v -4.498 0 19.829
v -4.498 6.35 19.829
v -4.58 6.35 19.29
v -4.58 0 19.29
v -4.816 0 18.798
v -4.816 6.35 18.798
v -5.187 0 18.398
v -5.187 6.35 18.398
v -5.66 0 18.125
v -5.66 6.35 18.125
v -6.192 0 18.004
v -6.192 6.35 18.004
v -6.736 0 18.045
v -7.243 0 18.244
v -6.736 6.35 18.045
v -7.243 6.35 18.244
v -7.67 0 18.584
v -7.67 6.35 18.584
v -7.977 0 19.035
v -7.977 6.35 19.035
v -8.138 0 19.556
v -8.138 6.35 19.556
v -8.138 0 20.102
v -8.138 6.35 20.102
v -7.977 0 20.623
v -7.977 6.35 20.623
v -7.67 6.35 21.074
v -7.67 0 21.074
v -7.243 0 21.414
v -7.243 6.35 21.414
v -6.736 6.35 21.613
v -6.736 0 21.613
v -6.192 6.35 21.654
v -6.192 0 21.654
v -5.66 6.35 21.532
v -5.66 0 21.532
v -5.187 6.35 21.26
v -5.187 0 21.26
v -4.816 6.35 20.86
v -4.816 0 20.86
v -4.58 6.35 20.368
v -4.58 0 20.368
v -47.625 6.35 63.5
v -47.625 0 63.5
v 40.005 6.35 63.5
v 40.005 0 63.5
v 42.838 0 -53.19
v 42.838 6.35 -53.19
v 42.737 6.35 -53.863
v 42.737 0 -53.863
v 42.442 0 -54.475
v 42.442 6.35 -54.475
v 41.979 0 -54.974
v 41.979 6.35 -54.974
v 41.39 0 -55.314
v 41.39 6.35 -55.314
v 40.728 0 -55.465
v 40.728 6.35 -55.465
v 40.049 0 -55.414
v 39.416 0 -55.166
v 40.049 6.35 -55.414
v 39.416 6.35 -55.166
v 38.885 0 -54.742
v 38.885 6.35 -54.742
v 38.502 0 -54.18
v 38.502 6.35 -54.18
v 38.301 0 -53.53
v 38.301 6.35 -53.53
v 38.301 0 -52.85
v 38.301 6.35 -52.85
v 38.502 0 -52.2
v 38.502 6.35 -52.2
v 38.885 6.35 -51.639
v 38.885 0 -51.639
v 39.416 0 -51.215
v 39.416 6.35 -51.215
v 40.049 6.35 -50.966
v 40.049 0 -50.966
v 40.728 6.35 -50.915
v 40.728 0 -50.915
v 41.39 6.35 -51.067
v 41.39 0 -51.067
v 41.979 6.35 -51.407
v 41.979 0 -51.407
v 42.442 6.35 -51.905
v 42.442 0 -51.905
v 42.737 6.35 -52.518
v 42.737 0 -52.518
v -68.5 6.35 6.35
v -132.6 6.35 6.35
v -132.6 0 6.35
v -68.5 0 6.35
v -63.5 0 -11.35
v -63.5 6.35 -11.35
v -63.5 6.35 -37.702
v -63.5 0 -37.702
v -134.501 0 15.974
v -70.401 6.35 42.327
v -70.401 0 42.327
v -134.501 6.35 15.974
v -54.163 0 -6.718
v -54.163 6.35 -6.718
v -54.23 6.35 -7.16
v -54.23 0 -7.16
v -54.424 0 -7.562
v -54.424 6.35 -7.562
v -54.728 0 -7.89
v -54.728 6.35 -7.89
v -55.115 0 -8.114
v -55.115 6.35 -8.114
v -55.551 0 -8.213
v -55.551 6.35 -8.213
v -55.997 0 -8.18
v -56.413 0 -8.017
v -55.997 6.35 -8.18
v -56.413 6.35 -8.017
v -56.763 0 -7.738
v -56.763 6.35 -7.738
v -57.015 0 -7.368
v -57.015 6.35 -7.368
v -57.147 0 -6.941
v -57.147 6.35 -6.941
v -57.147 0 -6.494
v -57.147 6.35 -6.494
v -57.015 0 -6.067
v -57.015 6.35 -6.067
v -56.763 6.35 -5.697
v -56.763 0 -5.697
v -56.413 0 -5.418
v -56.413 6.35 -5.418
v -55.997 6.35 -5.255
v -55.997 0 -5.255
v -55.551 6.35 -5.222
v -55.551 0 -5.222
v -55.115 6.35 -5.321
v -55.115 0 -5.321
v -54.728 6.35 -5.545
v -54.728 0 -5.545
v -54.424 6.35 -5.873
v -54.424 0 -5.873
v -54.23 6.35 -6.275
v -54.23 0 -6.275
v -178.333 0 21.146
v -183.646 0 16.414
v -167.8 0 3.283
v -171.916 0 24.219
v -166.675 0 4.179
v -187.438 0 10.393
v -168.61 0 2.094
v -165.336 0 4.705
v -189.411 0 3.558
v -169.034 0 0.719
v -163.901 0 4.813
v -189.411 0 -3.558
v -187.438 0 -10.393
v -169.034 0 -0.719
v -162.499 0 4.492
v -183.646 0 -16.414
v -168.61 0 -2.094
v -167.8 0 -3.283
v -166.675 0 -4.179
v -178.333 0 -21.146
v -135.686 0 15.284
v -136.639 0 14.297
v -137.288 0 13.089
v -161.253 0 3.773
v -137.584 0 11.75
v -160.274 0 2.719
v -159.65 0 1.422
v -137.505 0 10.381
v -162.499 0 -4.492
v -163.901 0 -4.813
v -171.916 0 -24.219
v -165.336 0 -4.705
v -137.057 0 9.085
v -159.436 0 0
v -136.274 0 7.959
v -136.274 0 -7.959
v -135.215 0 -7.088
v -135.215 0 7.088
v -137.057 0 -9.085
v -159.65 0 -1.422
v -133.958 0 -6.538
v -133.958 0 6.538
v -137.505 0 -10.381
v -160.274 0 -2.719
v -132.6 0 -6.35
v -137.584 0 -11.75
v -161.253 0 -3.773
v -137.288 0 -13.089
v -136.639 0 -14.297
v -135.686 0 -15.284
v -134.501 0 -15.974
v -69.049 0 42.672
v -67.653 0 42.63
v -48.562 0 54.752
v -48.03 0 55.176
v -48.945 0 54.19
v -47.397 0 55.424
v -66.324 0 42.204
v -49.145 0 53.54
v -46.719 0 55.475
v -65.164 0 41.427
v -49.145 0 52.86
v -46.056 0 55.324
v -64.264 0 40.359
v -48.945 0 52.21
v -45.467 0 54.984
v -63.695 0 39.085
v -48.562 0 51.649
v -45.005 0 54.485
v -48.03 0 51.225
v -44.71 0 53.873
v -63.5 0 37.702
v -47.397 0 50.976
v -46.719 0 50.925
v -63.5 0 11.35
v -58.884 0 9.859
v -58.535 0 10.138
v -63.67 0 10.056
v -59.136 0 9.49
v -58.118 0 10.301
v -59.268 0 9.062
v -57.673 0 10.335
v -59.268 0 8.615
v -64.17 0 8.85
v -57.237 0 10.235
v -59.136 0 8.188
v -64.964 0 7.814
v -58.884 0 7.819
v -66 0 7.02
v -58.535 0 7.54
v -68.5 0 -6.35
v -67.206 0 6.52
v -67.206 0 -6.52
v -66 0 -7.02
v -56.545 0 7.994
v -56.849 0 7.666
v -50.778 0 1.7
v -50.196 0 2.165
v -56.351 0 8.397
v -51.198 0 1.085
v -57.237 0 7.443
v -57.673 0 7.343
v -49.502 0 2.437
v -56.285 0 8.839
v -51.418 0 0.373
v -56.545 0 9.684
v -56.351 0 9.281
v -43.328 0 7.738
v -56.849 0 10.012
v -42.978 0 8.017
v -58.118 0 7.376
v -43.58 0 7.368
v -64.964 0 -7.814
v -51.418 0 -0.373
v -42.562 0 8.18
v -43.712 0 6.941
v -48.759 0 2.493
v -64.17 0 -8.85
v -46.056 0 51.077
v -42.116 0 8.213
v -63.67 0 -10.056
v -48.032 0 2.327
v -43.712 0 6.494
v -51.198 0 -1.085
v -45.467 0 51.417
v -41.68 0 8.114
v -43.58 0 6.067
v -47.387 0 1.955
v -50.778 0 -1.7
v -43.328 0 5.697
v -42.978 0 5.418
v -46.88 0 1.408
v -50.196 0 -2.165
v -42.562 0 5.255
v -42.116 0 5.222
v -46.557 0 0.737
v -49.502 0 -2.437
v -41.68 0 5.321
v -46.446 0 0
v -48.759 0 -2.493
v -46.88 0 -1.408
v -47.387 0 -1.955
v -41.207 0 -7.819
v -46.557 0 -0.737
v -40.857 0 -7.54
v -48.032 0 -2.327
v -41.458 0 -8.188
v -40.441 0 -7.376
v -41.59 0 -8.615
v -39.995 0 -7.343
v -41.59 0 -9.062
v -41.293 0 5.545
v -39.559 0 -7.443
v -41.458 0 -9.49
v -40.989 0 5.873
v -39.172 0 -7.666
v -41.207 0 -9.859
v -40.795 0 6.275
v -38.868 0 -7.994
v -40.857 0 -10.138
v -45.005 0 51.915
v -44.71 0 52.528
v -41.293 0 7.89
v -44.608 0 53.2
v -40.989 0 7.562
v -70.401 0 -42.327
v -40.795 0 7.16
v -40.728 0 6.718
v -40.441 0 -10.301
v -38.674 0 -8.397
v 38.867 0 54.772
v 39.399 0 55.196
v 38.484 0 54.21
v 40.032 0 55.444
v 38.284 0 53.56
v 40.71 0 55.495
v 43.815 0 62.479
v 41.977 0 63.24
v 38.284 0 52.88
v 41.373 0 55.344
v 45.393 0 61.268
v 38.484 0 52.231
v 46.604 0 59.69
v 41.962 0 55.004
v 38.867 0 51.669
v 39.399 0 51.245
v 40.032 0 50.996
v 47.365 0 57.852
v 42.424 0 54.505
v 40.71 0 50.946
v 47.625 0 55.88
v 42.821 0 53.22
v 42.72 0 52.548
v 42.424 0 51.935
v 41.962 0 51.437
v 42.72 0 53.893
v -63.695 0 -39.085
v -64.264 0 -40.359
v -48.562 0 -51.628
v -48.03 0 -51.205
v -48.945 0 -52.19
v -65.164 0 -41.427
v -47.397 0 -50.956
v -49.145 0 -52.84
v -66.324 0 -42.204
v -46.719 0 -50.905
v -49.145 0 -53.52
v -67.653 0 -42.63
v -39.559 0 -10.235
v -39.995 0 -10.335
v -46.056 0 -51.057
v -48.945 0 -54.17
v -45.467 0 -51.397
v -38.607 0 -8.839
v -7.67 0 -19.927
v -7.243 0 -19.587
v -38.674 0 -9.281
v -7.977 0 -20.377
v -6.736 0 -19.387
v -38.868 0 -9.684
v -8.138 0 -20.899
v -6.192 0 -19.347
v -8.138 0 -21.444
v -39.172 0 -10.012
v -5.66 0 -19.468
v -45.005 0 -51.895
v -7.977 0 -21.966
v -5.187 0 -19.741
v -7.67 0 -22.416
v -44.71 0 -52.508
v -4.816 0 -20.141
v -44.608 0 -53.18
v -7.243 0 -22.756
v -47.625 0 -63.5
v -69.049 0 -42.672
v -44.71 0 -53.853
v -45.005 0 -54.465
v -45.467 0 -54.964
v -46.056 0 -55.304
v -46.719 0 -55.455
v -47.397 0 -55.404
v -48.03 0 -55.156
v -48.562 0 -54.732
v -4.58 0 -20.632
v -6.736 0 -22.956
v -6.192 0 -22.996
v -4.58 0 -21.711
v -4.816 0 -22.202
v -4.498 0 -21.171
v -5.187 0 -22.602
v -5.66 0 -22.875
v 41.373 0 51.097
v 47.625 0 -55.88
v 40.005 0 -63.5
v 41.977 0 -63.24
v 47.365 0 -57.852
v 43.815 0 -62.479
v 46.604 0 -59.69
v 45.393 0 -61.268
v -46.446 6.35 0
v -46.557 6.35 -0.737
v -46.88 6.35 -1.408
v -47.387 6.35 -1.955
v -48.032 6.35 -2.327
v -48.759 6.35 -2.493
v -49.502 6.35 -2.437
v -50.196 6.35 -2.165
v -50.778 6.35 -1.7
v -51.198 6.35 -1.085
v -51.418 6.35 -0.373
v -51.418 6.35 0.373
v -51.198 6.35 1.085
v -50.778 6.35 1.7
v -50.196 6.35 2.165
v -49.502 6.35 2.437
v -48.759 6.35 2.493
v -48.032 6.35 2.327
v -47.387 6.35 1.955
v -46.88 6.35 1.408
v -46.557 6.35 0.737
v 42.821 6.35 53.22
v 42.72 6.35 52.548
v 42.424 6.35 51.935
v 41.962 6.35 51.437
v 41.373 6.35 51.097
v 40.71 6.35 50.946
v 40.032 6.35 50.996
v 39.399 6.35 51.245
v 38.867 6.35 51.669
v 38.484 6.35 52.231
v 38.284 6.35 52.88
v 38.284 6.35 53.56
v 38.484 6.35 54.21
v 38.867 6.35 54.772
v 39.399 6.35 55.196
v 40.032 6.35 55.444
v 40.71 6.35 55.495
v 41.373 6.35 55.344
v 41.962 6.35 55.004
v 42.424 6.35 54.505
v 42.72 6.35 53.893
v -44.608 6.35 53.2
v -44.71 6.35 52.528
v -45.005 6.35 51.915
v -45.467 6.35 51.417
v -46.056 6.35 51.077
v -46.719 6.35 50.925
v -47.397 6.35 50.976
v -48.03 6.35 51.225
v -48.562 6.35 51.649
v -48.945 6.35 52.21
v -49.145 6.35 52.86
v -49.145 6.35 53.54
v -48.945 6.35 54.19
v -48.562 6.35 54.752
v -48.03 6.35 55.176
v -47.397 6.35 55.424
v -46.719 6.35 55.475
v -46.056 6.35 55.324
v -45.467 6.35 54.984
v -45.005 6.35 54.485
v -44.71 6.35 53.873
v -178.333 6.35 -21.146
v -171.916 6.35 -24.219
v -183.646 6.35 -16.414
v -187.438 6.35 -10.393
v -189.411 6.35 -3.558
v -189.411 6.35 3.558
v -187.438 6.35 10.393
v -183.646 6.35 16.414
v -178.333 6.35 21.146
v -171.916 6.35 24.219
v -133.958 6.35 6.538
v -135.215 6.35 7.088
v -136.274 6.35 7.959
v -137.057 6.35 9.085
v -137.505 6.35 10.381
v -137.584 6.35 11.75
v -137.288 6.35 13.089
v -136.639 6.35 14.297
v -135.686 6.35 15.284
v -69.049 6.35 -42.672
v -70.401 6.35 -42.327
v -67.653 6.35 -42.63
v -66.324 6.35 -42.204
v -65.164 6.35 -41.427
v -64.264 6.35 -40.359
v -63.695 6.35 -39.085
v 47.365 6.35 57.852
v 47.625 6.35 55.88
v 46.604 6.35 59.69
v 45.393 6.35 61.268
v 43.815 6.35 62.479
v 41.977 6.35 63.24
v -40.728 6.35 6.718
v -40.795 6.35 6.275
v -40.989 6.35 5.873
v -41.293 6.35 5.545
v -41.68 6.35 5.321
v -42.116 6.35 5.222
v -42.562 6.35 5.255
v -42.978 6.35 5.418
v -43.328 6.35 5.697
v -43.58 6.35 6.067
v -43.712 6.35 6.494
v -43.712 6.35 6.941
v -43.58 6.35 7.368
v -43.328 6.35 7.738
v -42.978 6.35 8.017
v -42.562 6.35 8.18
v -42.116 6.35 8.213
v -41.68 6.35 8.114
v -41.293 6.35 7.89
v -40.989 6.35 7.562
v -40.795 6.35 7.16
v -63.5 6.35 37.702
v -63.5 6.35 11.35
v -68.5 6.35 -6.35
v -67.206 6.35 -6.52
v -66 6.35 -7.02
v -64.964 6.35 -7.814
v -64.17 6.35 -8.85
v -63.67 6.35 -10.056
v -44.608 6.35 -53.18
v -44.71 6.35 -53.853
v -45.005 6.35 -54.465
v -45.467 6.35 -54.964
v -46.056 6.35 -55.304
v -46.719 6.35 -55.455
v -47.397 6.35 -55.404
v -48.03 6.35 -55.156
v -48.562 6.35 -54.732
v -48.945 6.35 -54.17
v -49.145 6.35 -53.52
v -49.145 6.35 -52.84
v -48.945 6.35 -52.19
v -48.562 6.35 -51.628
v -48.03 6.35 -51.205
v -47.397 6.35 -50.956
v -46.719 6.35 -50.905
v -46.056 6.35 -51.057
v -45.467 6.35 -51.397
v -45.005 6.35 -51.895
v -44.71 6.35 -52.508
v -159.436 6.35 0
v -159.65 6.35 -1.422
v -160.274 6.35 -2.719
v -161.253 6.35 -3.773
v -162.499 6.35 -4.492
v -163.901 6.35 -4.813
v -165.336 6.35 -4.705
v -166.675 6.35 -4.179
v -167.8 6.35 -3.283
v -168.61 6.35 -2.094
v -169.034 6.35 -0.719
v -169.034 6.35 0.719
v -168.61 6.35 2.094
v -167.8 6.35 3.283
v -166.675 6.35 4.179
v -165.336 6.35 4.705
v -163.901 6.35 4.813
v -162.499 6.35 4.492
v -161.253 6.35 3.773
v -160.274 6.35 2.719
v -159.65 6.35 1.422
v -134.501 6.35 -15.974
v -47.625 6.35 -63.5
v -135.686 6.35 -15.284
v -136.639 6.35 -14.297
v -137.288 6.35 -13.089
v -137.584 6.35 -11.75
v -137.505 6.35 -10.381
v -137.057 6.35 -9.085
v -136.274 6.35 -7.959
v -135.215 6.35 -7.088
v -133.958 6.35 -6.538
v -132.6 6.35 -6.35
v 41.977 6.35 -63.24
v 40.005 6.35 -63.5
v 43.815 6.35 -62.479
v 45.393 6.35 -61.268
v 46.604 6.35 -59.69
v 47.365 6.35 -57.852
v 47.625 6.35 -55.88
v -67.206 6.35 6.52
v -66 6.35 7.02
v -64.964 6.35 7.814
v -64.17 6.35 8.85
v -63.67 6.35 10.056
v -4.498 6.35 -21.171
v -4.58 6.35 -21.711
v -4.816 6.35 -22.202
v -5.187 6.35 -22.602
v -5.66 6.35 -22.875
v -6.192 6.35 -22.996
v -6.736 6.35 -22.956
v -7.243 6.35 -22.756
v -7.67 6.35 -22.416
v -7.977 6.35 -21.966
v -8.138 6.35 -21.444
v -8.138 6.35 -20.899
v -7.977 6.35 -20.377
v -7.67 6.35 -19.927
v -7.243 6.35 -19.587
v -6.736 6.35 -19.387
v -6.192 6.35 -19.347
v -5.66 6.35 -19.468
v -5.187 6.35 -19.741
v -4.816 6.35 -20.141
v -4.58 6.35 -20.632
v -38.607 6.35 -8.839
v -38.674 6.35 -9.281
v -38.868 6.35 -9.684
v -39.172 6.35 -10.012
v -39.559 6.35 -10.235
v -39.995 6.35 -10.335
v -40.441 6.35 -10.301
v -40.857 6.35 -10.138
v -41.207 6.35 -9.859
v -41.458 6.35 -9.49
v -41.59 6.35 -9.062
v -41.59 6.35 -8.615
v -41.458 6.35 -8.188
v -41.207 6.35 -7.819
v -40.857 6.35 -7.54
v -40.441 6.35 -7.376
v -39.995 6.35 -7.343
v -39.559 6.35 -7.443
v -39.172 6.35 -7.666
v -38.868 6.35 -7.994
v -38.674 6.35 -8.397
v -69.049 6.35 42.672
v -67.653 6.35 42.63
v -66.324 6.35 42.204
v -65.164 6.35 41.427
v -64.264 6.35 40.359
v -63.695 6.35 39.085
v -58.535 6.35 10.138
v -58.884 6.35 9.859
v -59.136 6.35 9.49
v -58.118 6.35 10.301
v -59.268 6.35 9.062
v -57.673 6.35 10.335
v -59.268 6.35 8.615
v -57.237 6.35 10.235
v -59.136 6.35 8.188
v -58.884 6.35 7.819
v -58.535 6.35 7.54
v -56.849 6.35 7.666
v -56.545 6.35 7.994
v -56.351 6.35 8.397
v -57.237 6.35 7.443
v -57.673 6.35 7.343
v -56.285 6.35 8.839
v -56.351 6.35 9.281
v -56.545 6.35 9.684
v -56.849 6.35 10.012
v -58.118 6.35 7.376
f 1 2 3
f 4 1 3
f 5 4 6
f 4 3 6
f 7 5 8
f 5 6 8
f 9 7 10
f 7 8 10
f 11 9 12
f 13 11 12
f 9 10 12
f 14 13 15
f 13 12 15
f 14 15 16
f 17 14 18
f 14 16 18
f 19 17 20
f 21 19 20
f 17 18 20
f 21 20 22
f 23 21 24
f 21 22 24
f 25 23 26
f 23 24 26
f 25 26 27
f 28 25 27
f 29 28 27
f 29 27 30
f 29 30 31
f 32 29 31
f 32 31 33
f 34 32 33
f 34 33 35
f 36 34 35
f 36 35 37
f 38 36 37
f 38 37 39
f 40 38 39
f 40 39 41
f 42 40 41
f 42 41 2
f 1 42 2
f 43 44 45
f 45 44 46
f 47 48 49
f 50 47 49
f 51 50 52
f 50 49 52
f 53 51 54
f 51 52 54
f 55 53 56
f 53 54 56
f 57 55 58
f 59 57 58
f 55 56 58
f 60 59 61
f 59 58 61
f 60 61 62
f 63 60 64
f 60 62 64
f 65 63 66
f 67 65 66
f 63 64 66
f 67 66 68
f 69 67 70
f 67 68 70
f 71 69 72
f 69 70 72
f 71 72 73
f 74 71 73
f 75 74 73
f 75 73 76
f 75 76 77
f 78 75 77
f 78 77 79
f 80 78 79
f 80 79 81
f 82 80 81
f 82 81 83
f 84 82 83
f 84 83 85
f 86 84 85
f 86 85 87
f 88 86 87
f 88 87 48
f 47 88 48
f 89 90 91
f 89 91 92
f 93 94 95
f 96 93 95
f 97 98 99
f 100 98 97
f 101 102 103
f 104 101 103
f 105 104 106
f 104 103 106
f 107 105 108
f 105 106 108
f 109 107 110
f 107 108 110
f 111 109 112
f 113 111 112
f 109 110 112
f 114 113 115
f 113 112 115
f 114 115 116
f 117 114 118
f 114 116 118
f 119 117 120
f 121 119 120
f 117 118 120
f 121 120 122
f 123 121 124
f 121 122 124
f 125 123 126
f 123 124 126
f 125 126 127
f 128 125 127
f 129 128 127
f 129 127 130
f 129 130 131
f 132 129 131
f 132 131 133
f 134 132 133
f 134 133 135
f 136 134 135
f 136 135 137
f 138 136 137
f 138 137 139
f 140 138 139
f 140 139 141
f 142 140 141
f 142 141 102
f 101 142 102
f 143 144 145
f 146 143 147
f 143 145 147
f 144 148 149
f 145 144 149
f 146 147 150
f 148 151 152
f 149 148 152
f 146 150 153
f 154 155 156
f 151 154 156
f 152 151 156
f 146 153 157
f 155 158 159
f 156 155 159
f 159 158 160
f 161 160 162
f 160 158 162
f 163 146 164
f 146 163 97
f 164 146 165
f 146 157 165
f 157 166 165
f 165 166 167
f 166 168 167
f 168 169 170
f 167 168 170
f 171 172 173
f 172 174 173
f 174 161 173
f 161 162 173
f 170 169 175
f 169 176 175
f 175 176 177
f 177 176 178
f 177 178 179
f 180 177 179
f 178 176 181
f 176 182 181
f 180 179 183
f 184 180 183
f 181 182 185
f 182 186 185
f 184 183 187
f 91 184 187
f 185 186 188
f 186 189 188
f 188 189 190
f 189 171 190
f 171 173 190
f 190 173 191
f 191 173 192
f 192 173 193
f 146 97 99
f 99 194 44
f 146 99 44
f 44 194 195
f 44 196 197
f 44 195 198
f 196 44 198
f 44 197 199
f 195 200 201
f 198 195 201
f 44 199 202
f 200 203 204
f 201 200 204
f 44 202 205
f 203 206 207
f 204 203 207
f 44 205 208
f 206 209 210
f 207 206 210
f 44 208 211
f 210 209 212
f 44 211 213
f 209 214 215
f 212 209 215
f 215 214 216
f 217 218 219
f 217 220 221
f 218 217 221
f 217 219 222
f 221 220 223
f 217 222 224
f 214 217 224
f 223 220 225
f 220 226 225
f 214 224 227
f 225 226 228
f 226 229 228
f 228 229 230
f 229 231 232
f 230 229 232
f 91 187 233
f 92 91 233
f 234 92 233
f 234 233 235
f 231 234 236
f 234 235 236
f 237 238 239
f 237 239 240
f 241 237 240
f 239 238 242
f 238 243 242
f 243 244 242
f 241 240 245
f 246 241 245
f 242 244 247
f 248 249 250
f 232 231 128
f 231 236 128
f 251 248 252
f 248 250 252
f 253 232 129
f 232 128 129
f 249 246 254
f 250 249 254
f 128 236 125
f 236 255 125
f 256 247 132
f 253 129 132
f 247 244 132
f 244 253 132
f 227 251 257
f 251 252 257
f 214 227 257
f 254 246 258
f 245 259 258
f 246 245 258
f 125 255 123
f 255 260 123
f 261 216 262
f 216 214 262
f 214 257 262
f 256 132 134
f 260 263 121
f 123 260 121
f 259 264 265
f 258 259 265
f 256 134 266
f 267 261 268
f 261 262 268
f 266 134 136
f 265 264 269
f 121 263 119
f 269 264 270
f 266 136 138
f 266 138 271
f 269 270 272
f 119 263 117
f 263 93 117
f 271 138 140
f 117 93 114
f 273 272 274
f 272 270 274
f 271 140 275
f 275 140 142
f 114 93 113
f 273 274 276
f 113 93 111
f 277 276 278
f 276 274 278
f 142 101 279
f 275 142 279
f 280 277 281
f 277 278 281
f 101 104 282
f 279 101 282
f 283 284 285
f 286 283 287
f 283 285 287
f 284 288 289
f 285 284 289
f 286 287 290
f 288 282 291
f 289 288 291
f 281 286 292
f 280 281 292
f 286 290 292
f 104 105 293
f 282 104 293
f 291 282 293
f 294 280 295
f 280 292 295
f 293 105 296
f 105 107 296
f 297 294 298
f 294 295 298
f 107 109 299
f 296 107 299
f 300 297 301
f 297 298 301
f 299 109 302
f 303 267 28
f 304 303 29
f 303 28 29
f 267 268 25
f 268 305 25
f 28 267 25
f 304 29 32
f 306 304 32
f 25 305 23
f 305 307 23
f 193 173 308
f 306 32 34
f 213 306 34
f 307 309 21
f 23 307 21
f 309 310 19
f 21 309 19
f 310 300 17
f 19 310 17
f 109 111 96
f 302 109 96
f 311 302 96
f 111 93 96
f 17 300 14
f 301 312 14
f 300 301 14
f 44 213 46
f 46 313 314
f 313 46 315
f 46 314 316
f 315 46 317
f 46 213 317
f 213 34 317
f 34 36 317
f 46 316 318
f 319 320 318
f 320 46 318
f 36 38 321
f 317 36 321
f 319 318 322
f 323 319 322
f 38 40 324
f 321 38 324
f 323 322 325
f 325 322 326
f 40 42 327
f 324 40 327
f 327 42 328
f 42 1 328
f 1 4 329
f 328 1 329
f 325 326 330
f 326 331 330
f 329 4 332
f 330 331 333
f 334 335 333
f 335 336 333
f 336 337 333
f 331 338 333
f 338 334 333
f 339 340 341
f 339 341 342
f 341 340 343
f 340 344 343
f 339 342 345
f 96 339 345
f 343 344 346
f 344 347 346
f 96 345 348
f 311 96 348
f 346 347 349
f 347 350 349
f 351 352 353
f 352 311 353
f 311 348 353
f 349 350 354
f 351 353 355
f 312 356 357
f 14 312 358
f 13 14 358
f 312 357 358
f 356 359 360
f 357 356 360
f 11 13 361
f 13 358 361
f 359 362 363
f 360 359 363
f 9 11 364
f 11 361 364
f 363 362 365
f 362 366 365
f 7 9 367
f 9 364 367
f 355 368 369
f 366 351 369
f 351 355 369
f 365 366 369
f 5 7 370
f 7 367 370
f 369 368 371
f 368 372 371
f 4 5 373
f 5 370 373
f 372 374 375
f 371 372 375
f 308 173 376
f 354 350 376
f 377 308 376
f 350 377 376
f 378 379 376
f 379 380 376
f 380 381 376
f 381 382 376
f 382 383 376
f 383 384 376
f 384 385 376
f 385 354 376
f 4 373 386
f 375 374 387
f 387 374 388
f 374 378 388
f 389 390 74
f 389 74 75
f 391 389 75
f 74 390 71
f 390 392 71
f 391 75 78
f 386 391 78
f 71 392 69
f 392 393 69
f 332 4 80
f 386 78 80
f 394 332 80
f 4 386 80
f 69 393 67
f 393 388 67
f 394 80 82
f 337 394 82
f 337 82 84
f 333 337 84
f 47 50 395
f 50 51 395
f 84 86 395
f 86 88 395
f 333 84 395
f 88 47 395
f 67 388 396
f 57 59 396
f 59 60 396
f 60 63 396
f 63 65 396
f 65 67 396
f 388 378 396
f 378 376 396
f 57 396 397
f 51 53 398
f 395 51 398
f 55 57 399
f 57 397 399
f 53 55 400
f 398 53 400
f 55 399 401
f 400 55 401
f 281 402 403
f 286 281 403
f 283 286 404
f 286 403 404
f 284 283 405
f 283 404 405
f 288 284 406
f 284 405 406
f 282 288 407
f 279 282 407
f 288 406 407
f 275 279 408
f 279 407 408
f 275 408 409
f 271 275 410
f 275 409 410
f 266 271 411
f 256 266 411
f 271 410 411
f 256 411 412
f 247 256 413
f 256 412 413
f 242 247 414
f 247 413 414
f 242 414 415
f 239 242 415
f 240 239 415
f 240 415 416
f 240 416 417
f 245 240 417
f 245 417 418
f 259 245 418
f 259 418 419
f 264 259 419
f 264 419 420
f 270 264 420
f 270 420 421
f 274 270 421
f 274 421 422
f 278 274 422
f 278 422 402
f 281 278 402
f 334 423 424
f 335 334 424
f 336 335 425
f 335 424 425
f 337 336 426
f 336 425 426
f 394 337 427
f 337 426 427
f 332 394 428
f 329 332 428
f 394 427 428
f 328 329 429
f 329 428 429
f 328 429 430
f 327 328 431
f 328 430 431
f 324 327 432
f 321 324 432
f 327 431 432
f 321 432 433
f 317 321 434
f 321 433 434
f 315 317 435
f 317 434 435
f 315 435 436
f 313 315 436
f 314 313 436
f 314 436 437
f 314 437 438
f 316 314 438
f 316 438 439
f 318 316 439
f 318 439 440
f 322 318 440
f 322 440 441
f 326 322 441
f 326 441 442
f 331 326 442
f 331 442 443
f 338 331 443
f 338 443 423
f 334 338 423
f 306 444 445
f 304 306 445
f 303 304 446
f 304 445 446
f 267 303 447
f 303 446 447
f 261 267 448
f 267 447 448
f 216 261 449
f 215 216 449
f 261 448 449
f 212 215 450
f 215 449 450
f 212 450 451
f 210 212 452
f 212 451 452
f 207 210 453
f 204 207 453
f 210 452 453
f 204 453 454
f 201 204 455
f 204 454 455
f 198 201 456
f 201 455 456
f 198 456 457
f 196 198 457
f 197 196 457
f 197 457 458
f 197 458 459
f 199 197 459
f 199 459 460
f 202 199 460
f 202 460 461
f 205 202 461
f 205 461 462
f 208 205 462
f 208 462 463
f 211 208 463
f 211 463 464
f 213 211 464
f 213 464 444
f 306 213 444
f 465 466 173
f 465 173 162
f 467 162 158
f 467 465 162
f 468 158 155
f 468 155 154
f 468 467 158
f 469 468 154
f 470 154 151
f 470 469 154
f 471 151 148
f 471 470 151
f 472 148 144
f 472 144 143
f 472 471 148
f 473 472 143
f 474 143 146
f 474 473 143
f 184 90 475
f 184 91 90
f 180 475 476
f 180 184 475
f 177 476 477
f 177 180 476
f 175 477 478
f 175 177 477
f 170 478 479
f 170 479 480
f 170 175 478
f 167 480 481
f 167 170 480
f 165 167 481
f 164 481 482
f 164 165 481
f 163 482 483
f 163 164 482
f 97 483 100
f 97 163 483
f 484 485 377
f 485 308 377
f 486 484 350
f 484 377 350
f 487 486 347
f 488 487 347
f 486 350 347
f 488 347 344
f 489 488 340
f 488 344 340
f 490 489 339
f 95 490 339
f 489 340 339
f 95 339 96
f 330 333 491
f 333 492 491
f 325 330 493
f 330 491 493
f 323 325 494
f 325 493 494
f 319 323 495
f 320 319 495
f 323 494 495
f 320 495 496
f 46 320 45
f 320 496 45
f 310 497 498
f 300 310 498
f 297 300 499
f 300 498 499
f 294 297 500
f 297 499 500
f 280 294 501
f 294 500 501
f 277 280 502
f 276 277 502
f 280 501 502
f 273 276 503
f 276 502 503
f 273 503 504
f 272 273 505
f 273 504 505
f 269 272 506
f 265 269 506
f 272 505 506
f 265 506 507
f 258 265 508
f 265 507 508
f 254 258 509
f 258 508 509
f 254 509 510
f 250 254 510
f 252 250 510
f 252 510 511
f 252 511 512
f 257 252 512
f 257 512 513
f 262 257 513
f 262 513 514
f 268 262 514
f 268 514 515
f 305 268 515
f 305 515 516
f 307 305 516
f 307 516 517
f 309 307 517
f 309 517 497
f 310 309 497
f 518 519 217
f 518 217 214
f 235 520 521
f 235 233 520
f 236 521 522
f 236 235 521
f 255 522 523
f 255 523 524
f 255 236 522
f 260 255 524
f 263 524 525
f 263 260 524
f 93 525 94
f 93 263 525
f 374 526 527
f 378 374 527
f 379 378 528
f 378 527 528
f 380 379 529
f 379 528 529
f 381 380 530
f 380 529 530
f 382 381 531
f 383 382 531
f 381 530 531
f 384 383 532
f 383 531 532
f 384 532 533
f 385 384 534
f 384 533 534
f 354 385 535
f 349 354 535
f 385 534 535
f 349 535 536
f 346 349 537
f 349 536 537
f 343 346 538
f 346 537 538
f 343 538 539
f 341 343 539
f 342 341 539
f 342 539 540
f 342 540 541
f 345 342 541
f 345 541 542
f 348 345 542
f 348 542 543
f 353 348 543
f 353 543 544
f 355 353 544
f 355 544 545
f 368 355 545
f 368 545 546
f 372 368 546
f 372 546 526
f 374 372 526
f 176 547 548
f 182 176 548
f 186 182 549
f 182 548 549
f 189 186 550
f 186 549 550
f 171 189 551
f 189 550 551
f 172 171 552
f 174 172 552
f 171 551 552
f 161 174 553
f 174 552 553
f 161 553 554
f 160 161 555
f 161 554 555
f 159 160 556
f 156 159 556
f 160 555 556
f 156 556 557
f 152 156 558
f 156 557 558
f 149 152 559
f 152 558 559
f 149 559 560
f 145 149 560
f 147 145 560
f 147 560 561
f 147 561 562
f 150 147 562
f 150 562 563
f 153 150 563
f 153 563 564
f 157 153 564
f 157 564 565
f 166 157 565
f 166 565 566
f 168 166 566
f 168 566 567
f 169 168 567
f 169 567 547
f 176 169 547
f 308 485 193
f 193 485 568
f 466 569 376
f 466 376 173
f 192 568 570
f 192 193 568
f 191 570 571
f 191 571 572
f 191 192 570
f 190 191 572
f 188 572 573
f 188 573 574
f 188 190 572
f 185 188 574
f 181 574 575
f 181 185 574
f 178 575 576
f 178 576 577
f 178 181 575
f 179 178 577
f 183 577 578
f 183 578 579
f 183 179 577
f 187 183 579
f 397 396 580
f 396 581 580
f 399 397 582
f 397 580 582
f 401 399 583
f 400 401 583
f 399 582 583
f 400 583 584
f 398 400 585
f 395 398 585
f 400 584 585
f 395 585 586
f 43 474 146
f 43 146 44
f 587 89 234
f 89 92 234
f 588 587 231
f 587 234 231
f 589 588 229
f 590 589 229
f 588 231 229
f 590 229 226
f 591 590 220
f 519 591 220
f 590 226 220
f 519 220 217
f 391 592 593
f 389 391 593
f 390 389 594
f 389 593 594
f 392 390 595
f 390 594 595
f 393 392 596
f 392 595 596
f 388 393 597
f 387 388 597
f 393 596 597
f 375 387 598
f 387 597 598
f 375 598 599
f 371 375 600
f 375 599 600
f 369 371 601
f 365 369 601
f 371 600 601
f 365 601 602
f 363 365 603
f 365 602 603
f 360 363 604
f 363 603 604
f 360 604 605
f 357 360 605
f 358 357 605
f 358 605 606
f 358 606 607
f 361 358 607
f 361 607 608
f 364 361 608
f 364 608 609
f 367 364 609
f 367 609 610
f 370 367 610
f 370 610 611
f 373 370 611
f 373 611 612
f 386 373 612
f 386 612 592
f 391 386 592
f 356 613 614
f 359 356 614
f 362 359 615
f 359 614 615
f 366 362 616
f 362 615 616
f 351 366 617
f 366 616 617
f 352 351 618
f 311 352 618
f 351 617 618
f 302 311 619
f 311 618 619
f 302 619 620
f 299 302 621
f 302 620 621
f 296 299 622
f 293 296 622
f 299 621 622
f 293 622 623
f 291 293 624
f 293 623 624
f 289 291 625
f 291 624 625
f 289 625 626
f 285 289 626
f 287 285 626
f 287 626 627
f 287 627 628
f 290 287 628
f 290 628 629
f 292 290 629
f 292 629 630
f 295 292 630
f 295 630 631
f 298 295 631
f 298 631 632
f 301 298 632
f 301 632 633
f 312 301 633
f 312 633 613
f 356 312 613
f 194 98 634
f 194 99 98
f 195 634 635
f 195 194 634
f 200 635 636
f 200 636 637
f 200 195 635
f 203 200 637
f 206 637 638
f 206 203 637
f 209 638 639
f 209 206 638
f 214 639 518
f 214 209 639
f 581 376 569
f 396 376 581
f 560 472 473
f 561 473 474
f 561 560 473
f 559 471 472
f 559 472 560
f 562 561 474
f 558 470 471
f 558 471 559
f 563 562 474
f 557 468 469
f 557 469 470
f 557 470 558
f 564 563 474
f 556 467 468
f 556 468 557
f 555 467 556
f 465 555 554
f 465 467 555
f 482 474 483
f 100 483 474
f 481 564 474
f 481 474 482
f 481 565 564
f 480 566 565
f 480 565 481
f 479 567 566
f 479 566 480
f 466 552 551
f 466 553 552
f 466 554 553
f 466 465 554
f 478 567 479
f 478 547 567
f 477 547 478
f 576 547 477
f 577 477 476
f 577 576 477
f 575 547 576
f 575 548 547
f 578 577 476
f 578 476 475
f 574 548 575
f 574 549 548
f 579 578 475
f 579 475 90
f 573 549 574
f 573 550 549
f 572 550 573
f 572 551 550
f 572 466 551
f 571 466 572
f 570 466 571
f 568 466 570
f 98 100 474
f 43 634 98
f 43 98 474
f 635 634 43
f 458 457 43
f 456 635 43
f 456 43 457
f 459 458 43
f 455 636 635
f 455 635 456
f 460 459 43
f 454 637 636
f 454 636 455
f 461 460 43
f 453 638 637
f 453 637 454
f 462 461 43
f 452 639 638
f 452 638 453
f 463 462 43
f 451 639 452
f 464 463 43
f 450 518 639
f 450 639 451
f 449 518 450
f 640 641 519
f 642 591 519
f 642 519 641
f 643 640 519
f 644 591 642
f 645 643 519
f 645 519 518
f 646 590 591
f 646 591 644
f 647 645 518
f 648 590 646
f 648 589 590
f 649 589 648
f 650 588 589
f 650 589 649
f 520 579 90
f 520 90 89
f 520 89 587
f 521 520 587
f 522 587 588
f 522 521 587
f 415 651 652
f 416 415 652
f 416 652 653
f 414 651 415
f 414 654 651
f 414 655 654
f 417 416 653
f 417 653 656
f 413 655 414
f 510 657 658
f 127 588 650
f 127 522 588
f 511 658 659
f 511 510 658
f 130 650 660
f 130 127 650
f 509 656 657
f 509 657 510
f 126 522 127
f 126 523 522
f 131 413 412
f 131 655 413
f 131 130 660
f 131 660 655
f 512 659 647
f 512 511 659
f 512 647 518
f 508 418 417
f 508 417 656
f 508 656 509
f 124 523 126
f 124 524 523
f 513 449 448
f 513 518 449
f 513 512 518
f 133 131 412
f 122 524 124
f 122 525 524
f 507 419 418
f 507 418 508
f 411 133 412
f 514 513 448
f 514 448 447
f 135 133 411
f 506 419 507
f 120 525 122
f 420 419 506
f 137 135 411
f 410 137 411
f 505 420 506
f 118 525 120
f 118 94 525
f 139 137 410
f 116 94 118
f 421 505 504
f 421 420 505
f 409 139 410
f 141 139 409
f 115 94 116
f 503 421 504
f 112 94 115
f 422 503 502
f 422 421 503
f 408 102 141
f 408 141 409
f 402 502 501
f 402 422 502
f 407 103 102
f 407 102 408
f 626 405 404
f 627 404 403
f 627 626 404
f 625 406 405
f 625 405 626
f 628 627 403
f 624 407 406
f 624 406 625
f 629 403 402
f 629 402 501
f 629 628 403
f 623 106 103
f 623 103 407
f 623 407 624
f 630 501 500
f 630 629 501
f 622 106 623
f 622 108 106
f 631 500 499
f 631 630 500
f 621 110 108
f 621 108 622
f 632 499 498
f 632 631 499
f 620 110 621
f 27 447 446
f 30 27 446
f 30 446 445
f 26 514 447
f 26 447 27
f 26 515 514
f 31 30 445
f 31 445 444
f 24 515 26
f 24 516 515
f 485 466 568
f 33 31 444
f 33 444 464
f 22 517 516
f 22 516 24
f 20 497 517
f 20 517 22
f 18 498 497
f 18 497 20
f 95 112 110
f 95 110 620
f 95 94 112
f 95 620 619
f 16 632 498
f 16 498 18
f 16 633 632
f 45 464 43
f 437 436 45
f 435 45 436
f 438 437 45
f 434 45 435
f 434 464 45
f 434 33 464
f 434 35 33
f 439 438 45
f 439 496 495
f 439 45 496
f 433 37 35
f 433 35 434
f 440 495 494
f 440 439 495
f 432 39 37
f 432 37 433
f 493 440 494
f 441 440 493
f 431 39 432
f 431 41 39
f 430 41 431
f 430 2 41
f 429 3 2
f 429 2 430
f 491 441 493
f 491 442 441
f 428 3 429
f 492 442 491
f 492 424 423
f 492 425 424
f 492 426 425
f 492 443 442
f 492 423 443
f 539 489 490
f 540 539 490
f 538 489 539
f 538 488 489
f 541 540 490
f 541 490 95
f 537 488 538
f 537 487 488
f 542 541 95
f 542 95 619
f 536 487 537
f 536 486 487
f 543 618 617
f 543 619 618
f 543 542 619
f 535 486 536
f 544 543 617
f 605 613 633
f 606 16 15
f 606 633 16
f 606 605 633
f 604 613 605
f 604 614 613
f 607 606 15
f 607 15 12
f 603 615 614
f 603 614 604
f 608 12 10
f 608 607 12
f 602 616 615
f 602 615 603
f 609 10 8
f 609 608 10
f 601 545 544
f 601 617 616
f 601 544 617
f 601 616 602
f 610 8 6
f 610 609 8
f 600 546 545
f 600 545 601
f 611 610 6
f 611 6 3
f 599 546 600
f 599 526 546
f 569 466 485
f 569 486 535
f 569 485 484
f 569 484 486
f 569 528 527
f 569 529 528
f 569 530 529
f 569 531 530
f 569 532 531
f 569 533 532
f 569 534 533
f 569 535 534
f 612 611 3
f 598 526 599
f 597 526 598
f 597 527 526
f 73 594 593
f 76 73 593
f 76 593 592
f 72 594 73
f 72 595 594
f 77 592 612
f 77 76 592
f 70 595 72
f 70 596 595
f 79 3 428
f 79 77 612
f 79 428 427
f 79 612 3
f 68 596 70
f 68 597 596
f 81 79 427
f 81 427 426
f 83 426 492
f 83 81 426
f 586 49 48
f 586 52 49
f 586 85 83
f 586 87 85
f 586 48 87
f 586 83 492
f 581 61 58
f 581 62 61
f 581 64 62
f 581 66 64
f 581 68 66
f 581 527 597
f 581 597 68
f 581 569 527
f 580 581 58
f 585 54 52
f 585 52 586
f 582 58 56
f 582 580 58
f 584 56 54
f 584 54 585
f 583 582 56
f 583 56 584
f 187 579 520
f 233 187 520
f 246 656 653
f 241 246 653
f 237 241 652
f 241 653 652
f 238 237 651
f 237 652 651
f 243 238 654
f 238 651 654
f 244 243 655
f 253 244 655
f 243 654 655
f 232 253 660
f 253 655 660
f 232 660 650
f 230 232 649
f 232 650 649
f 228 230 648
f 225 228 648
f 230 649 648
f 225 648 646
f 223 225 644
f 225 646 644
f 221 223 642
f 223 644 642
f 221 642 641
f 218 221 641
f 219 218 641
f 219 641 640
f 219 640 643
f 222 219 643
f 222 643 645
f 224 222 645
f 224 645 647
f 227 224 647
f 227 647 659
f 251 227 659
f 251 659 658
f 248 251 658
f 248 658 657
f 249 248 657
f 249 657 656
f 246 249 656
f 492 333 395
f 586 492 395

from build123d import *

# Parameters (mm, degrees)
SKETCH1_W           = 95.25
SKETCH1_H           = 127
BOSS_EXTRUDE1_DEPTH = 6.35
BOSS_EXTRUDE3_DEPTH = 6.35
SKETCH5_R           = 4.826
SKETCH5_R_2         = 2.5
SKETCH5_R_3         = 1.5
CUT_EXTRUDE1_DEPTH  = 7.35
CUT_EXTRUDE2_DEPTH  = 7.35
FILLET9_R           = 5
FILLET10_R          = 7.62
SKETCH7_R           = 2.2812375
CUT_EXTRUDE3_DEPTH  = 7.35
SKETCH8_R           = 1.830008083
CUT_EXTRUDE4_DEPTH  = 7.35


with BuildPart() as part:
    # Sketch1 → Boss-Extrude1 (new body)
    with BuildSketch(Plane(origin=(0, 0, 0), x_dir=(1, 0, 0), z_dir=(0, 1, 0))):
        Rectangle(SKETCH1_W, SKETCH1_H)
    extrude(amount=BOSS_EXTRUDE1_DEPTH)

    # Sketch4 → Boss-Extrude3 (add)
    with BuildSketch(Plane(origin=(0, 6.35, 0), x_dir=(1, 0, 0), z_dir=(0, 1, 0))):
        with BuildLine():
            Line((-47.625, 63.5), (-171.916018217, 24.219268021))
            ThreePointArc((-171.916018217, 24.219268021), (-189.6618, 0), (-171.916018217, -24.219268021))
            Line((-171.916018217, -24.219268021), (-47.625, -63.5))
            Line((-47.625, -63.5), (-47.625, 63.5))
        make_face()
    extrude(amount=-BOSS_EXTRUDE3_DEPTH)

    # Sketch5 → Cut-Extrude1 (cut, through all)
    with BuildSketch(Plane(origin=(0, 6.35, 0), x_dir=(1, 0, 0), z_dir=(0, 1, 0))):
        with Locations((-164.2618, 0)):
            Circle(SKETCH5_R)
        with Locations((-48.9458, 0)):
            Circle(SKETCH5_R_2)
        with Locations((-40.106965235, 8.838834765)):
            Circle(SKETCH5_R_3)
        with Locations((-57.784634765, -8.838834765)):
            Circle(SKETCH5_R_3)
        with Locations((-55.663314421, 6.717514421)):
            Circle(SKETCH5_R_3)
        with Locations((-42.228285579, -6.717514421)):
            Circle(SKETCH5_R_3)
    extrude(amount=-CUT_EXTRUDE1_DEPTH, mode=Mode.SUBTRACT)

    # Sketch6 → Cut-Extrude2 (cut, through all)
    with BuildSketch(Plane(origin=(0, 6.35, 0), x_dir=(1, 0, 0), z_dir=(0, 1, 0))):
        Polygon((-63.5, 45.163743355), (-157.9118, 6.35), (-63.5, 6.35), align=None)
        Polygon((-63.5, -6.35), (-63.5, -45.163743355), (-157.9118, -6.35), align=None)
    extrude(amount=-CUT_EXTRUDE2_DEPTH, mode=Mode.SUBTRACT)

    # Fillet9
    fillet9_edges = [part.edges().sort_by_distance(p)[0] for p in [
        (-63.5, 3.175, -45.163743355),
        (-63.5, 3.175, -6.35),
        (-157.9118, 3.175, -6.35),
        (-157.9118, 3.175, 6.35),
        (-63.5, 3.175, 6.35),
        (-63.5, 3.175, 45.163743355),
    ]]
    fillet(fillet9_edges, radius=FILLET9_R)

    # Fillet10
    fillet10_edges = [part.edges().sort_by_distance(p)[0] for p in [
        (47.625, 3.175, 63.5),
        (47.625, 3.175, -63.5),
    ]]
    fillet(fillet10_edges, radius=FILLET10_R)

    # Sketch7 → Cut-Extrude3 (cut, through all)
    with BuildSketch(Plane(origin=(0, 6.35, 0), x_dir=(1, 0, 0), z_dir=(0, 1, 0))):
        with Locations((-46.889614099, -53.200246229)):
            Circle(SKETCH7_R)
        with Locations((-46.889614099, 53.180131976)):
            Circle(SKETCH7_R)
        with Locations((40.557033552, 53.190189103)):
            Circle(SKETCH7_R)
        with Locations((40.539614099, -53.220360481)):
            Circle(SKETCH7_R)
    extrude(amount=-CUT_EXTRUDE3_DEPTH, mode=Mode.SUBTRACT)

    # Sketch8 → Cut-Extrude4 (cut, through all)
    with BuildSketch(Plane(origin=(0, 6.35, 0), x_dir=(1, 0, 0), z_dir=(0, 1, 0))):
        with Locations((-6.328465047, -19.828924843)):
            Circle(SKETCH8_R)
        with Locations((-6.328338046, 21.171490961)):
            Circle(SKETCH8_R)
    extrude(amount=-CUT_EXTRUDE4_DEPTH, mode=Mode.SUBTRACT)


solid = part.part
